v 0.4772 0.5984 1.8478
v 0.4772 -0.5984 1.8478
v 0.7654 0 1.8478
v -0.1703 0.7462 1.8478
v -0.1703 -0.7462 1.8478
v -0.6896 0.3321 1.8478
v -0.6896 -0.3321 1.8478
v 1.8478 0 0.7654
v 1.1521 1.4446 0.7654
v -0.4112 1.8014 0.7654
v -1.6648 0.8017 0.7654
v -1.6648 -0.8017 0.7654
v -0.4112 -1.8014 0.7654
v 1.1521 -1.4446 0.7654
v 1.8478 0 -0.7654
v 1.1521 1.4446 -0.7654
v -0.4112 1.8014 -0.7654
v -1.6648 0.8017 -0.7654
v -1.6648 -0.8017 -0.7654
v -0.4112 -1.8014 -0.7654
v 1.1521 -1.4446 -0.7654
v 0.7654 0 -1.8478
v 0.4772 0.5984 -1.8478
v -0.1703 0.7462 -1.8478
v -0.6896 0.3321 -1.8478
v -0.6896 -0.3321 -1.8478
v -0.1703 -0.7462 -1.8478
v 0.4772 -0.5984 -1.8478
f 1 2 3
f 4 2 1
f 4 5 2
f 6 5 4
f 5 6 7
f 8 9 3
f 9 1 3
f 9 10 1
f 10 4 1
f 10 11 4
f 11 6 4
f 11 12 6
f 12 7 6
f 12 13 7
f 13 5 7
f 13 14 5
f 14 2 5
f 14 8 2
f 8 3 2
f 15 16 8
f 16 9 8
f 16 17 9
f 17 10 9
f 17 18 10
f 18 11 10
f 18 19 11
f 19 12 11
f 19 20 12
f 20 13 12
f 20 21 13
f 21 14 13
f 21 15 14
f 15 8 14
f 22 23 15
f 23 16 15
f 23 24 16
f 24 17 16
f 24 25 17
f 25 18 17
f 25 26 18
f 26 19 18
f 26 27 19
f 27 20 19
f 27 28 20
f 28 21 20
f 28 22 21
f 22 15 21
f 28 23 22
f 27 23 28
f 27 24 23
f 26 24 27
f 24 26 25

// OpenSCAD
/*
<json>
    {
        "Name": "Item 1",
        "Desc": "Use the slider to indicate how many columns printed acceptably.",
        "LowKeyword": "Lost",
        "HighKeyword": "Printed",
        "varBase": "PosPillarDiaV",
        "minDefault": 0.1,
        "maxDefault": 2,
        "minDefaultND": "0.5 * nozzleDiameter",
        "maxDefaultND": "5 * nozzleDiameter",
        "cameraData": "-2.28,2.59,6.06,59.9,0,13.8,113.4",
        "sortOrder": 0,
		"instanceCount": 10
    }
</json>
*/

sphere(d=4);

/*
<json>
    {
        "Name": "Item 2",
        "Desc": "Use the slider to indicate how many columns printed acceptably.",
        "LowKeyword": "Lost",
        "HighKeyword": "Printed",
        "varBase": "PosPillarDiaV",
        "minDefault": 0.1,
        "maxDefault": 2,
        "minDefaultND": "0.5 * nozzleDiameter",
        "maxDefaultND": "5 * nozzleDiameter",
        "cameraData": "-2.28,2.59,6.06,59.9,0,13.8,113.4",
        "sortOrder": 0,
		"instanceCount": 10
    }
</json>
*/
